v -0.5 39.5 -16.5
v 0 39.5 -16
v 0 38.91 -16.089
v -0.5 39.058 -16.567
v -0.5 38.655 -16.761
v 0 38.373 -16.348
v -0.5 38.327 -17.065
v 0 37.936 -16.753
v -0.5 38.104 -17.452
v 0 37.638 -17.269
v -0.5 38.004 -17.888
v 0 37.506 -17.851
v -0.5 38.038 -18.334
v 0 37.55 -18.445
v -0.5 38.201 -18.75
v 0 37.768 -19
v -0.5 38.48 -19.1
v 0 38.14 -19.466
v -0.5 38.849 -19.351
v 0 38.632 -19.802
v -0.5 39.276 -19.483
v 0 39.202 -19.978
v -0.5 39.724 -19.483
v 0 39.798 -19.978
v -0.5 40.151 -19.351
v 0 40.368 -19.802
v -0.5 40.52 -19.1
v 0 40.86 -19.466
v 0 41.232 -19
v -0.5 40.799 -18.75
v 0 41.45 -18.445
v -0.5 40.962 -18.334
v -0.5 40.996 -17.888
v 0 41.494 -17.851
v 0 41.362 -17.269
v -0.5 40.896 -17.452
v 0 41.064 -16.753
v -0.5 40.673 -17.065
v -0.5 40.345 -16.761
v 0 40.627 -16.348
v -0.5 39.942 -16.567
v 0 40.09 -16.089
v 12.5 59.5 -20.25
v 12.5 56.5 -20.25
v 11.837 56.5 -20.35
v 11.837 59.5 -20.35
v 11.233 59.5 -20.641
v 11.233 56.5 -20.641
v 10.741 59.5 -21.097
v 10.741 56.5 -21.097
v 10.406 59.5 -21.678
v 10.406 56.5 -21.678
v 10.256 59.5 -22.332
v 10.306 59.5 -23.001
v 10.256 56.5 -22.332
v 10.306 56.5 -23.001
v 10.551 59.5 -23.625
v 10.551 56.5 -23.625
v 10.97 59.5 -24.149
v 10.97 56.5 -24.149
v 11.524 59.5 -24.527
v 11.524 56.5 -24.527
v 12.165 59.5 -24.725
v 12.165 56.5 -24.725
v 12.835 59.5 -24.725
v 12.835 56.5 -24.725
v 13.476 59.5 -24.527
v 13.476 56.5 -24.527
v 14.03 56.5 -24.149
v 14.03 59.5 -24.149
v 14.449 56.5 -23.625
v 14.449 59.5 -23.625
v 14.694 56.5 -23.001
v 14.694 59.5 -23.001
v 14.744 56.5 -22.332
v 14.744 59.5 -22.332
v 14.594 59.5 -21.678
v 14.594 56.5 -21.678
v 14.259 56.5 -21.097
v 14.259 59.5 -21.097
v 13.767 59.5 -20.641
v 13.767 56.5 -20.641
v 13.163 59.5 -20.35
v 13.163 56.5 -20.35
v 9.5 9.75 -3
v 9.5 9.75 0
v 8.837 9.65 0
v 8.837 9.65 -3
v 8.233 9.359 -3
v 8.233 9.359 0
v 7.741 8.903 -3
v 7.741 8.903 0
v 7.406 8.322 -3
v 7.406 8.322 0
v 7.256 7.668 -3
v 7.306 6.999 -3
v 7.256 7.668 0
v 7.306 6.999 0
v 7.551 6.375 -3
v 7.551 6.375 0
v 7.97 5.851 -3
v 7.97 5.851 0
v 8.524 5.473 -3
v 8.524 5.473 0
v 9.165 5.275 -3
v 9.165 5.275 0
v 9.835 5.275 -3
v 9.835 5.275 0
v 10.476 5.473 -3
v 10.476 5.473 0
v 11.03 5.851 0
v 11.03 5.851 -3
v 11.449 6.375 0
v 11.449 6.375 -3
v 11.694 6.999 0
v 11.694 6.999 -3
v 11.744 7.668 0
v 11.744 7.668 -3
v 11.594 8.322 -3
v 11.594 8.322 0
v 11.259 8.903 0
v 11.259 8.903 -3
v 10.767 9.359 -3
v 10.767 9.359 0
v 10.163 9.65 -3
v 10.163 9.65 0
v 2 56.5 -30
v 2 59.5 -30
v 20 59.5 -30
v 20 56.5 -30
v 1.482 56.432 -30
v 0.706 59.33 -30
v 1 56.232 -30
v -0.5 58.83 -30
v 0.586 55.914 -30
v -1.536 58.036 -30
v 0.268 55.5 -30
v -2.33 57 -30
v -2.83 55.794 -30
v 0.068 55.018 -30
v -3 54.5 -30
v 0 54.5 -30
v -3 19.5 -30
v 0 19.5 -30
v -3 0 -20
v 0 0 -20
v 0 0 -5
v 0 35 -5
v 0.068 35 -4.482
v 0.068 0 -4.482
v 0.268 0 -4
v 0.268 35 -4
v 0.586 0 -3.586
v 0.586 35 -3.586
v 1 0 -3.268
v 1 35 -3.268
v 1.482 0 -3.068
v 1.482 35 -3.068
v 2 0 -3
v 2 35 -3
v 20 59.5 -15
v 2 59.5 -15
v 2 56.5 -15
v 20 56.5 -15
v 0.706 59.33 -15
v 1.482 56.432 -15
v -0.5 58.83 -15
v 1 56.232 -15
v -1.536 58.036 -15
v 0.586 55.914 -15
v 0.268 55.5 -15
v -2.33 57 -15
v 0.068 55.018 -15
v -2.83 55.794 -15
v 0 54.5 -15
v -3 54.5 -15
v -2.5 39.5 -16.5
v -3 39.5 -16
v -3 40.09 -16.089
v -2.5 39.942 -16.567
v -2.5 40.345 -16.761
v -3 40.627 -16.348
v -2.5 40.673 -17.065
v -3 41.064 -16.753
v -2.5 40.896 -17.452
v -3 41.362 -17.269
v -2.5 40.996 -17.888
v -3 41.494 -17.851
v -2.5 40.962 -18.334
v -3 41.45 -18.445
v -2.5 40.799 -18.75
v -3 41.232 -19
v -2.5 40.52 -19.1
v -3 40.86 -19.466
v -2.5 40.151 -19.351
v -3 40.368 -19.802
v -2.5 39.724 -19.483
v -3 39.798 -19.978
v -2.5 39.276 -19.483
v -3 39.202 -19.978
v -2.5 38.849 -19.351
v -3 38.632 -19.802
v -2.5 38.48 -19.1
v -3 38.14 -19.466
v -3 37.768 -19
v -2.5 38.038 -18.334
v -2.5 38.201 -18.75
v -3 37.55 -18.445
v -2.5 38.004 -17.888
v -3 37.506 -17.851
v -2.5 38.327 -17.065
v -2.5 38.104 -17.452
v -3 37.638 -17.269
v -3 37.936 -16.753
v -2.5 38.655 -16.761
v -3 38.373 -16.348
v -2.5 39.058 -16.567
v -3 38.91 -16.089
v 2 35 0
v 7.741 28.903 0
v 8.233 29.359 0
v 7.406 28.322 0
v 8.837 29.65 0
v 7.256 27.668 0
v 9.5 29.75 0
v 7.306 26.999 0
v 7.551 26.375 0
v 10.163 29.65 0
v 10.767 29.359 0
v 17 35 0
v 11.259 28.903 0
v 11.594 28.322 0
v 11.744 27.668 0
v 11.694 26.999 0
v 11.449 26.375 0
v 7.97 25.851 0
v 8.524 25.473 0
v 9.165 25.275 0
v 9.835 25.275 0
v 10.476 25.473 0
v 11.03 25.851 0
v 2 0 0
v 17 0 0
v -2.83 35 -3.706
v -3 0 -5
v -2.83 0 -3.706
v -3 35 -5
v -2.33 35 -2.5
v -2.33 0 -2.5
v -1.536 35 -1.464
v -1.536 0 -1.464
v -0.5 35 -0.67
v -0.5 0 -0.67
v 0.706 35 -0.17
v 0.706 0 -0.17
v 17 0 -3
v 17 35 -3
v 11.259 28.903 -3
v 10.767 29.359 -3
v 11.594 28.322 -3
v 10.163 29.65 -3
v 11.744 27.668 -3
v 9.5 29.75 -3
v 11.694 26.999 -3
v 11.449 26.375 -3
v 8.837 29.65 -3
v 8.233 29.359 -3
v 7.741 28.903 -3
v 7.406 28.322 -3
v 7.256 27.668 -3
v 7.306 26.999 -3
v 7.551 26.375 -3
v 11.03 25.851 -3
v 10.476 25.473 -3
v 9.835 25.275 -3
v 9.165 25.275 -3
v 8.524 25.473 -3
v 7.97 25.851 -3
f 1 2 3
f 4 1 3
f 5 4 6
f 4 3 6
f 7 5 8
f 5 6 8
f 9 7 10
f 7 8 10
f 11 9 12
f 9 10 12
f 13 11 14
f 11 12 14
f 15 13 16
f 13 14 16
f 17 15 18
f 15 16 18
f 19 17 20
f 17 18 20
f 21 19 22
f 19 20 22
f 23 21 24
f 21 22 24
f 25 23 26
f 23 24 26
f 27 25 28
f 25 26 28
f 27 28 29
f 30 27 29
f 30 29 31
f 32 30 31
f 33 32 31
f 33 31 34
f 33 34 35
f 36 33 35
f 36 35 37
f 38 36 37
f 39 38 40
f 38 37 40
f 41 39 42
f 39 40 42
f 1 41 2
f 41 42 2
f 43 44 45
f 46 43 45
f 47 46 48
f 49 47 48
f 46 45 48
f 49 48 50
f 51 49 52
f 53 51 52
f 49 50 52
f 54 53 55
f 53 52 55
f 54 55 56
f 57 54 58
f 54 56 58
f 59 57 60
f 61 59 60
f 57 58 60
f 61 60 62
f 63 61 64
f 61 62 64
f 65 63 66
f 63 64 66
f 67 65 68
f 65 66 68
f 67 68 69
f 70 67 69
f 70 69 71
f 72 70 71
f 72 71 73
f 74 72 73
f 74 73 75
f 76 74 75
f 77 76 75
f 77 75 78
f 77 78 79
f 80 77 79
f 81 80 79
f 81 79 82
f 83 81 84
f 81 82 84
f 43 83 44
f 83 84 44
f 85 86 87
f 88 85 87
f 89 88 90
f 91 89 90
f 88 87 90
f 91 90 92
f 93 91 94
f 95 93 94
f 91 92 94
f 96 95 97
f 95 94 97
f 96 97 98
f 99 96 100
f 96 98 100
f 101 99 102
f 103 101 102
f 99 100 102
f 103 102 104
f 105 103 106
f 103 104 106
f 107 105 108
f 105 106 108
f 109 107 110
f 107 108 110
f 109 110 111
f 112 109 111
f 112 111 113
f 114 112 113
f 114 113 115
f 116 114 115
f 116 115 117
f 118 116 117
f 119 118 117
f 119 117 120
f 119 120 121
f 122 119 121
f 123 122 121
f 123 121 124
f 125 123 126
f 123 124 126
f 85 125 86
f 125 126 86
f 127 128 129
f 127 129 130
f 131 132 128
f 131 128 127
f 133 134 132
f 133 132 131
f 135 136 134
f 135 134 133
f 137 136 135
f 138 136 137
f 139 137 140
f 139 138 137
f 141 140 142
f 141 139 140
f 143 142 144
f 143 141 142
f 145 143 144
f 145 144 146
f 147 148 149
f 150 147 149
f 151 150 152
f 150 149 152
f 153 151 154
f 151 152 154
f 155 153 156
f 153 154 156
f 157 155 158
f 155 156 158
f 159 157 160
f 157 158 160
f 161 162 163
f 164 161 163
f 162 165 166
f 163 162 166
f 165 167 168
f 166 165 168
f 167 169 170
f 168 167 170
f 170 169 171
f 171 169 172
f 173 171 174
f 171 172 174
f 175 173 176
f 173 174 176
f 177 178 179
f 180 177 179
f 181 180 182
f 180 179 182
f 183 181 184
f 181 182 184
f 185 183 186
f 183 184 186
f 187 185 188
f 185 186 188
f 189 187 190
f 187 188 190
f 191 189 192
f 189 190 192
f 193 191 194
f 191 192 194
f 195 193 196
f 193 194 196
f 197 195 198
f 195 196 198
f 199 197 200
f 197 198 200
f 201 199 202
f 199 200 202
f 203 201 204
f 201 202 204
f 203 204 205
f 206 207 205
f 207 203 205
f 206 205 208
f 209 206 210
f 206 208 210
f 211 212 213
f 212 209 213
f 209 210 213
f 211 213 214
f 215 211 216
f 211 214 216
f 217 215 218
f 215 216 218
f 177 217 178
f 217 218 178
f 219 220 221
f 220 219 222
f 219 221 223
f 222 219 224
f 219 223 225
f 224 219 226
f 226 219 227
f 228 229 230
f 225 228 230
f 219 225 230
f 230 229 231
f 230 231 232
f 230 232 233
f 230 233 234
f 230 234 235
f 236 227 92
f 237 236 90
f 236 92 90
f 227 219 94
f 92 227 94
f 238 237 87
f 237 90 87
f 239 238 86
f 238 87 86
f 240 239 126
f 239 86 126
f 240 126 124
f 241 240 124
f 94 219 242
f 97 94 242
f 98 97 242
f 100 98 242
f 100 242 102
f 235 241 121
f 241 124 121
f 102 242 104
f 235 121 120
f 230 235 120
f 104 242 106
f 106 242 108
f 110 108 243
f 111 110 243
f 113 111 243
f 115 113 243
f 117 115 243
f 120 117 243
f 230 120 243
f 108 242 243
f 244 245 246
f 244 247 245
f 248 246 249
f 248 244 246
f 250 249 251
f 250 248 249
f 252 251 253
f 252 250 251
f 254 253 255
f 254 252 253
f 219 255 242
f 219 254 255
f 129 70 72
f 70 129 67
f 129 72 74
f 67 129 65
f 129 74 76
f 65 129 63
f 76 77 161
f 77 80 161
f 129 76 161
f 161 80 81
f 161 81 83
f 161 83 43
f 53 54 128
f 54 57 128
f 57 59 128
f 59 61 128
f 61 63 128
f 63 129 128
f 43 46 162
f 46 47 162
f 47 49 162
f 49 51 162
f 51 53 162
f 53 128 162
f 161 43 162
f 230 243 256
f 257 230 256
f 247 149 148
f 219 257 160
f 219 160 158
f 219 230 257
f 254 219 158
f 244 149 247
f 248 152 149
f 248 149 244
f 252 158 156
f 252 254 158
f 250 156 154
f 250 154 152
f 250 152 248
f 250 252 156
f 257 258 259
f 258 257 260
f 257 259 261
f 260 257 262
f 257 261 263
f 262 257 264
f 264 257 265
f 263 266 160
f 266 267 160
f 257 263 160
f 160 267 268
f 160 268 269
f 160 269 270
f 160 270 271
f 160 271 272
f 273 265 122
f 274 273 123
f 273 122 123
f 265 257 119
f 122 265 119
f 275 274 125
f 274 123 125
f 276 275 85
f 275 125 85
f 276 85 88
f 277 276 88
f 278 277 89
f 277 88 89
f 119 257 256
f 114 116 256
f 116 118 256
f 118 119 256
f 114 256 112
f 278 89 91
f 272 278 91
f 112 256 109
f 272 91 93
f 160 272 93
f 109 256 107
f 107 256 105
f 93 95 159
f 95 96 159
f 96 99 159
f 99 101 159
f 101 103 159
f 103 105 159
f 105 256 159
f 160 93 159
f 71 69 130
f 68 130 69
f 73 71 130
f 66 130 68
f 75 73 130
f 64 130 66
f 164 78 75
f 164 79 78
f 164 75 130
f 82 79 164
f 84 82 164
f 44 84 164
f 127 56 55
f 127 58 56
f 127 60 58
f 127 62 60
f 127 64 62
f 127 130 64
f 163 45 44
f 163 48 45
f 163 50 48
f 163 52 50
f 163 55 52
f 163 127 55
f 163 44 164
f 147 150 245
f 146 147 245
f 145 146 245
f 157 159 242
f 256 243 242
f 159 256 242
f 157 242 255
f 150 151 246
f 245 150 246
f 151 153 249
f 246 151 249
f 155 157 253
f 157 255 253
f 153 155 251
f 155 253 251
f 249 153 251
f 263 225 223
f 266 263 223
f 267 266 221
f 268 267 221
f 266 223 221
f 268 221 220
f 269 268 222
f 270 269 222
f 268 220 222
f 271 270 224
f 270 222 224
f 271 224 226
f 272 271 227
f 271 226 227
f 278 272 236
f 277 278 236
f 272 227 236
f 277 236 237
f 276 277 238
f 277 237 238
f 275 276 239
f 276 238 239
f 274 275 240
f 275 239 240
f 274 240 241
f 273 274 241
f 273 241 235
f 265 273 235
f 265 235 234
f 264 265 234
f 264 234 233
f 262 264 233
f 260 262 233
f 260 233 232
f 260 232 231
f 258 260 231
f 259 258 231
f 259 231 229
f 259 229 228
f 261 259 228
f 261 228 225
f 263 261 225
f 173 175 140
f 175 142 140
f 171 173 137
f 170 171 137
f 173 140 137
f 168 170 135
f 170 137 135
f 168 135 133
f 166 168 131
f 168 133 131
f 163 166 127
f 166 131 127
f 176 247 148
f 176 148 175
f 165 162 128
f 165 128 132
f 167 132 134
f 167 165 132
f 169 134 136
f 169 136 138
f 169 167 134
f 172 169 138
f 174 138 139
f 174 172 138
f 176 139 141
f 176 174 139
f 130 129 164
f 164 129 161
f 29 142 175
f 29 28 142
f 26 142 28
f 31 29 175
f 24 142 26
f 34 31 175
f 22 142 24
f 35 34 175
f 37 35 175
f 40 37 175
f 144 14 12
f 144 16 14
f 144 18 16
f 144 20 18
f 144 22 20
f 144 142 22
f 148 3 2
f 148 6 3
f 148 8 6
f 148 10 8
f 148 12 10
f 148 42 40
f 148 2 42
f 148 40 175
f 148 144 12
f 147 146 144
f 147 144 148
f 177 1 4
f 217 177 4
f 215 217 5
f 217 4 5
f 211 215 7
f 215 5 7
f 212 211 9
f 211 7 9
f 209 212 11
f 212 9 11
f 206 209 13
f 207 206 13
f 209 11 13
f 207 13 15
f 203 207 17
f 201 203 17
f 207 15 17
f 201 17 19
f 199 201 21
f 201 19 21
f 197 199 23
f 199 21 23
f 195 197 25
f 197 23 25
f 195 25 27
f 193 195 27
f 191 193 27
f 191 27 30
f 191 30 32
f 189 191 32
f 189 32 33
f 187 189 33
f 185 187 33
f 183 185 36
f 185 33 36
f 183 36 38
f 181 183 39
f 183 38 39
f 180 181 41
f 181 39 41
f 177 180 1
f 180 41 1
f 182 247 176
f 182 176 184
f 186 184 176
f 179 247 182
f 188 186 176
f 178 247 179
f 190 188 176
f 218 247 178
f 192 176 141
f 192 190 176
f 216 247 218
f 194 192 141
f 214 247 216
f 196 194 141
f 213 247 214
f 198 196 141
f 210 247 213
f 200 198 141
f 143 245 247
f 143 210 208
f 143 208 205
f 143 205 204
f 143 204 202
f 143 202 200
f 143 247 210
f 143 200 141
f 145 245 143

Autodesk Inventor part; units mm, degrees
ref_plane "YZ Plane" through (0, 0, 0) normal (1, 0, 0) x (0, 1, 0)
ref_plane "XZ Plane" through (0, 0, 0) normal (0, 1, 0) x (-1, 0, 0)
ref_plane "XY Plane" through (0, 0, 0) normal (0, 0, 1) x (1, 0, 0)
sketch "Sketch1" plane through (0, 0, 0) normal (0, 1, 0) x (-1, 0, 0)
  line L0 (0, 0) -> (-17, 0)
  line L1 (-17, 0) -> (-17, -3)
  line L2 (-17, -3) -> (0, -3)
  line L3 (0, -3) -> (0, 0)
  line L4 (0, 0) -> (3, 0)
  line L5 (3, 0) -> (3, -20)
  line L6 (3, -20) -> (0, -20)
  line L7 (0, -20) -> (0, 0)
  dimension "d0" = 3
  dimension "d1" = 3
  dimension "d3" = 20
  dimension "d56" = 20
extrude "Extrusion1" add sketch "Sketch1" along normal blind 35
fillet "Fillet1" radius 2 1 edges at (0, 17.5, -3)
fillet "Fillet2" radius 5 1 edges at (-3, 17.5, 0)
sketch "Sketch3" plane through (17, 0, -3) normal (0, 0, -1) x (1, 0, 0)
  line L0 (0, -35) -> (-15, -35) projected
  line L1 (-15, 0) -> (0, 0) projected
  line L2 (0, 0) -> (0, -35) projected
  point P0 (-17, 0)
  point P1 (-7.5, -27.5)
  point P2 (-17, 35)
  point P3 (-17, 0)
  point P4 (-7.5, -7.5)
  point P5 (-17, -35)
  dimension "d21" = 7.5
  dimension "d57" = 7.5
  dimension "d58" = 7.5
hole "Hole2" at (9.5, 27.5, -3) at (9.5, 7.5, -3) direction (0, 0, 1) diameter 4.5 end through all clearance for "Socket Head Cap Screw" size "M4" standard "Ansi Metric M Profile"
sketch "Sketch4" plane through (-3, 0, -20) normal (-1, 0, 0) x (0, 0, 1)
  line L0 (15, 35) -> (5, 54.5)
  line L1 (5, 54.5) -> (-10, 54.5)
  line L2 (-10, 54.5) -> (-10, 19.5)
  line L3 (0, 0) -> (0, 35) projected
  line L4 (-10, 19.5) -> (0, 0)
  line L5 (5, 54.5) -> (-10, 54.5)
  line L6 (-10, 54.5) -> (-10, 59.5)
  line L7 (-10, 59.5) -> (5, 59.5)
  line L8 (5, 59.5) -> (5, 54.5)
  line L9 (20, 0) -> (20, 35) projected
  line L10 (17, 25.25) -> (17, 29.75) projected
  line L11 (20, 29.75) -> (20, 25.25) projected
  line L12 (17, 25.25) -> (17, 29.75) projected
  line L13 (0, 35) -> (15, 35) projected
  dimension "d30" = 5
  dimension "d32" = 15
  dimension "d34" = 15
  dimension "d59" = 19.5
extrude "Extrusion2" add sketch "Sketch4" against normal up to surface (3 mm away)
sketch "Sketch5" plane through (-3, 19.5, -30) normal (-1, 0, 0) x (0, 0, 1)
  line L0 (10, -19.5) -> (25, -19.5) projected
  line L1 (0, 40) -> (0, 0) projected
  line L2 (15, 40) -> (0, 40)
  line L3 (0, 40) -> (0, 37)
  line L4 (0, 37) -> (15, 37)
  line L5 (15, 37) -> (15, 40)
  line L6 (25, 15.5) -> (15, 35) projected
  line L7 (15, 35) -> (15, 40) projected
  line L8 (15, 40) -> (0, 40) projected
  line L9 (0, 40) -> (0, 0) projected
  line L10 (0, 0) -> (10, -19.5) projected
  line L11 (25, 15.5) -> (25, -19.5) projected
  point P0 (30, -19.5)
  dimension "d52" = 3
  dimension "d53" = 15
extrude "Extrusion3" add sketch "Sketch5" against normal blind 23 contours L1 L2 L5 L4
fillet "Fillet3" radius 2 1 edges at (0, 56.5, -22.5)
fillet "Fillet4" radius 5 1 edges at (-3, 59.5, -22.5)
sketch "Sketch6" plane through (22, 59.5, -15) normal (0, 1, 0) x (-1, 0, 0)
  line L0 (2, -15) -> (2, 0) projected
  point P0 (9.5, -7.5)
  point P1 (2, -7.5)
  point P2 (2, -7.5)
  dimension "d54" = 7.5
hole "Hole3" at (12.5, 59.5, -22.5) direction (0, -1, 0) diameter 4.5 end through all clearance for "Flat Head Machine Screw" size "M4" standard "Ansi Metric M Profile"
sketch "Sketch7" plane through (-3, 0, -20) normal (-1, 0, 0) x (0, 0, 1)
  line L0 (-10, 54.5) -> (5, 54.5) projected
  line L1 (-10, 54.5) -> (-10, 19.5) projected
  point P0 (20, 0)
  point P1 (2, 39.5)
  dimension "d60" = 15
  dimension "d61" = 12
hole "Hole4" at (-3, 39.5, -18) direction (1, 0, 0) diameter 3 end through all
chamfer "Chamfer1" distance 0.5 angle 45 2 edges at (-3, 39.5, -19.5) (0, 39.5, -19.5)
equation "\"d1\" = d0"
equation "\"d21\" = d19"
equation "\"d58\" = d57"
equation "\"d19\" = 7.5"
properties part number "Top_Angle Bracket Small" material "Aluminum 6061"
